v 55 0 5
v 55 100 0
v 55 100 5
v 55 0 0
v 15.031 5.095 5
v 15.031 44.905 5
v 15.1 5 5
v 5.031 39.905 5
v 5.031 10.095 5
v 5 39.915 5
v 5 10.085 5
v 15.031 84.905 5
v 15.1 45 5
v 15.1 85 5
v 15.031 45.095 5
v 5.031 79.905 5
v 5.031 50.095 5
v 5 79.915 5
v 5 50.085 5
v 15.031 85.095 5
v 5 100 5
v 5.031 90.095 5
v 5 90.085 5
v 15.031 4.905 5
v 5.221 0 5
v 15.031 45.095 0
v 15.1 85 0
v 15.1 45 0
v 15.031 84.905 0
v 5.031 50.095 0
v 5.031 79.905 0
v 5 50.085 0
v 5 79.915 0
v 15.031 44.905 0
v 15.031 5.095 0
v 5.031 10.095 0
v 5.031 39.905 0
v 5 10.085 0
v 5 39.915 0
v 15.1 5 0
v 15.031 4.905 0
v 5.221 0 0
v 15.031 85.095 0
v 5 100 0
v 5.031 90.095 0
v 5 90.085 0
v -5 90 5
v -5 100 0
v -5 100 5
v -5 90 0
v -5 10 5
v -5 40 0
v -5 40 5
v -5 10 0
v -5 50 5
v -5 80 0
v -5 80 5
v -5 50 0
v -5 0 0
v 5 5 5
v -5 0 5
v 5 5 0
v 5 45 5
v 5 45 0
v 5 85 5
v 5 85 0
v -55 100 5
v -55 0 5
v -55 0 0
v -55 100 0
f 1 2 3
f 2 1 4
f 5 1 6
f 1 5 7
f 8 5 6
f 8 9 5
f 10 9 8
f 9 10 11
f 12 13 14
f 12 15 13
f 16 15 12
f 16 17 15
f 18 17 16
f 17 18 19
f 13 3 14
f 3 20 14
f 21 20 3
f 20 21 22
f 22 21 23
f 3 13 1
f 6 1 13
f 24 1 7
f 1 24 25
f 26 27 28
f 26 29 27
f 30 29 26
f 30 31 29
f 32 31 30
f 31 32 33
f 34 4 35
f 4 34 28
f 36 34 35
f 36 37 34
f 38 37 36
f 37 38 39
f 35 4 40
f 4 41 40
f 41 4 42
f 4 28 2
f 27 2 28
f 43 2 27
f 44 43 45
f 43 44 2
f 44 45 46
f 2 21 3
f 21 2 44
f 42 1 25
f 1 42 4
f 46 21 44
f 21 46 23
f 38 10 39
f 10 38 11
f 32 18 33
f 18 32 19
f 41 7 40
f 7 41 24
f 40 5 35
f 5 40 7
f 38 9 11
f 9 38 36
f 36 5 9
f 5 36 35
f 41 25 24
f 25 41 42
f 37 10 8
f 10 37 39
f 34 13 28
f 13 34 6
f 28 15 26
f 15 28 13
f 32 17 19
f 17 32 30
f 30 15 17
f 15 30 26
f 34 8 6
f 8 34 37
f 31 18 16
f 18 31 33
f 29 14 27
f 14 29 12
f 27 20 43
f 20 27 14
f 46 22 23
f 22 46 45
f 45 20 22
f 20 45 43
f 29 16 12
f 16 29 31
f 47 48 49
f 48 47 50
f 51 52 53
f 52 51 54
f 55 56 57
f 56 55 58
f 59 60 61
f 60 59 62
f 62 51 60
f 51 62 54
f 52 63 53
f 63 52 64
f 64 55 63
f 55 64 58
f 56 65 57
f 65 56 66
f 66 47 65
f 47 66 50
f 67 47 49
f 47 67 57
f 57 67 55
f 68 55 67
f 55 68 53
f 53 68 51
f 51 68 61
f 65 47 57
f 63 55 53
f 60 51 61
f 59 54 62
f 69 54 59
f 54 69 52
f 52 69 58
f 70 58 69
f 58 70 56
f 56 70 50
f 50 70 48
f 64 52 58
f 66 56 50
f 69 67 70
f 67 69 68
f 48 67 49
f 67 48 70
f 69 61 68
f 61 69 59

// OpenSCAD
// file: ../cuts2/leftright.scad
module LeftRight( apart, minX, maxX, minY, maxY, minZ, maxZ, y, play ) {
    yy = len(y) == 0 ? [ minY : ( maxY - minY ) / 10 : maxY ] : y;

    echo( "y=", y, "yy=", yy );

    translate( [ apart/2, 0, 0 ] )
    Right( minX=minX, maxX=maxX, minY=minY, maxY=maxY, minZ=minZ, maxZ=maxZ, y=yy, play=play ) {
        children(0);
        children(1);
    };

    translate( [ -apart/2, 0, 0 ] )
    Left( minX=minX, maxX=maxX, minY=minY, maxY=maxY, minZ=minZ, maxZ=maxZ, y=yy, play=play ) {
        children(0);
        children(1);
    };
};

module Right( minX, maxX, minY, maxY, minZ, maxZ, y, play ) {
    echo( "play=", play );
    difference() {
        intersection() {
            children(0);
            translate( [ 0, minY, minZ ] ) {
                cube( [ maxX, maxY - minY, maxZ - minZ ] );
            }
        };

        for( yy=y ) {
            translate( [ 0, yy, minZ ] ) {
                minkowski() {
                    linear_extrude( height = maxZ - minZ ) {
                        children(1);
                    };
                    sphere( r=play );
                }
            }
        }
    }
}

module Left( minX, maxX, minY, maxY, minZ, maxZ, y, play ) {
    difference() {
        children(0);
        difference() {
            translate( [ 0, minY, minZ ] ) {
                cube( [ maxX, maxY - minY, maxZ - minZ ] );
            };

            for( yy=y ) {
                translate( [ 0, yy, minZ ] ) {
                    linear_extrude( height = maxZ - minZ ) {
                        children(1);
                    }
                }
            }
        }
    }
}
// file: ../cuts2/zigzag.scad
use <leftright.scad>

module ZigZag( apart=10, minX=-200, maxX=200, minY=-200, maxY=200, minZ=-200, maxZ=200, play=.1, y=[] ) {
    LeftRight( apart, minX, maxX, minY, maxY, minZ, maxZ, y=y, play=play ) {
        children(0);

        polygon( points=[
                [ 0, 0 ],
                [ 10, 5 ],
                [ 0, 10 ],
                [ 0, 0 ]
        ] );
    };
};
// main file
use <../cuts2/zigzag.scad>

module MyPart() {
    translate( [ -50, 0, 0 ] ) {
        cube( [ 100, 100, 5 ] );
    }
}

ZigZag() {
    MyPart();
}
